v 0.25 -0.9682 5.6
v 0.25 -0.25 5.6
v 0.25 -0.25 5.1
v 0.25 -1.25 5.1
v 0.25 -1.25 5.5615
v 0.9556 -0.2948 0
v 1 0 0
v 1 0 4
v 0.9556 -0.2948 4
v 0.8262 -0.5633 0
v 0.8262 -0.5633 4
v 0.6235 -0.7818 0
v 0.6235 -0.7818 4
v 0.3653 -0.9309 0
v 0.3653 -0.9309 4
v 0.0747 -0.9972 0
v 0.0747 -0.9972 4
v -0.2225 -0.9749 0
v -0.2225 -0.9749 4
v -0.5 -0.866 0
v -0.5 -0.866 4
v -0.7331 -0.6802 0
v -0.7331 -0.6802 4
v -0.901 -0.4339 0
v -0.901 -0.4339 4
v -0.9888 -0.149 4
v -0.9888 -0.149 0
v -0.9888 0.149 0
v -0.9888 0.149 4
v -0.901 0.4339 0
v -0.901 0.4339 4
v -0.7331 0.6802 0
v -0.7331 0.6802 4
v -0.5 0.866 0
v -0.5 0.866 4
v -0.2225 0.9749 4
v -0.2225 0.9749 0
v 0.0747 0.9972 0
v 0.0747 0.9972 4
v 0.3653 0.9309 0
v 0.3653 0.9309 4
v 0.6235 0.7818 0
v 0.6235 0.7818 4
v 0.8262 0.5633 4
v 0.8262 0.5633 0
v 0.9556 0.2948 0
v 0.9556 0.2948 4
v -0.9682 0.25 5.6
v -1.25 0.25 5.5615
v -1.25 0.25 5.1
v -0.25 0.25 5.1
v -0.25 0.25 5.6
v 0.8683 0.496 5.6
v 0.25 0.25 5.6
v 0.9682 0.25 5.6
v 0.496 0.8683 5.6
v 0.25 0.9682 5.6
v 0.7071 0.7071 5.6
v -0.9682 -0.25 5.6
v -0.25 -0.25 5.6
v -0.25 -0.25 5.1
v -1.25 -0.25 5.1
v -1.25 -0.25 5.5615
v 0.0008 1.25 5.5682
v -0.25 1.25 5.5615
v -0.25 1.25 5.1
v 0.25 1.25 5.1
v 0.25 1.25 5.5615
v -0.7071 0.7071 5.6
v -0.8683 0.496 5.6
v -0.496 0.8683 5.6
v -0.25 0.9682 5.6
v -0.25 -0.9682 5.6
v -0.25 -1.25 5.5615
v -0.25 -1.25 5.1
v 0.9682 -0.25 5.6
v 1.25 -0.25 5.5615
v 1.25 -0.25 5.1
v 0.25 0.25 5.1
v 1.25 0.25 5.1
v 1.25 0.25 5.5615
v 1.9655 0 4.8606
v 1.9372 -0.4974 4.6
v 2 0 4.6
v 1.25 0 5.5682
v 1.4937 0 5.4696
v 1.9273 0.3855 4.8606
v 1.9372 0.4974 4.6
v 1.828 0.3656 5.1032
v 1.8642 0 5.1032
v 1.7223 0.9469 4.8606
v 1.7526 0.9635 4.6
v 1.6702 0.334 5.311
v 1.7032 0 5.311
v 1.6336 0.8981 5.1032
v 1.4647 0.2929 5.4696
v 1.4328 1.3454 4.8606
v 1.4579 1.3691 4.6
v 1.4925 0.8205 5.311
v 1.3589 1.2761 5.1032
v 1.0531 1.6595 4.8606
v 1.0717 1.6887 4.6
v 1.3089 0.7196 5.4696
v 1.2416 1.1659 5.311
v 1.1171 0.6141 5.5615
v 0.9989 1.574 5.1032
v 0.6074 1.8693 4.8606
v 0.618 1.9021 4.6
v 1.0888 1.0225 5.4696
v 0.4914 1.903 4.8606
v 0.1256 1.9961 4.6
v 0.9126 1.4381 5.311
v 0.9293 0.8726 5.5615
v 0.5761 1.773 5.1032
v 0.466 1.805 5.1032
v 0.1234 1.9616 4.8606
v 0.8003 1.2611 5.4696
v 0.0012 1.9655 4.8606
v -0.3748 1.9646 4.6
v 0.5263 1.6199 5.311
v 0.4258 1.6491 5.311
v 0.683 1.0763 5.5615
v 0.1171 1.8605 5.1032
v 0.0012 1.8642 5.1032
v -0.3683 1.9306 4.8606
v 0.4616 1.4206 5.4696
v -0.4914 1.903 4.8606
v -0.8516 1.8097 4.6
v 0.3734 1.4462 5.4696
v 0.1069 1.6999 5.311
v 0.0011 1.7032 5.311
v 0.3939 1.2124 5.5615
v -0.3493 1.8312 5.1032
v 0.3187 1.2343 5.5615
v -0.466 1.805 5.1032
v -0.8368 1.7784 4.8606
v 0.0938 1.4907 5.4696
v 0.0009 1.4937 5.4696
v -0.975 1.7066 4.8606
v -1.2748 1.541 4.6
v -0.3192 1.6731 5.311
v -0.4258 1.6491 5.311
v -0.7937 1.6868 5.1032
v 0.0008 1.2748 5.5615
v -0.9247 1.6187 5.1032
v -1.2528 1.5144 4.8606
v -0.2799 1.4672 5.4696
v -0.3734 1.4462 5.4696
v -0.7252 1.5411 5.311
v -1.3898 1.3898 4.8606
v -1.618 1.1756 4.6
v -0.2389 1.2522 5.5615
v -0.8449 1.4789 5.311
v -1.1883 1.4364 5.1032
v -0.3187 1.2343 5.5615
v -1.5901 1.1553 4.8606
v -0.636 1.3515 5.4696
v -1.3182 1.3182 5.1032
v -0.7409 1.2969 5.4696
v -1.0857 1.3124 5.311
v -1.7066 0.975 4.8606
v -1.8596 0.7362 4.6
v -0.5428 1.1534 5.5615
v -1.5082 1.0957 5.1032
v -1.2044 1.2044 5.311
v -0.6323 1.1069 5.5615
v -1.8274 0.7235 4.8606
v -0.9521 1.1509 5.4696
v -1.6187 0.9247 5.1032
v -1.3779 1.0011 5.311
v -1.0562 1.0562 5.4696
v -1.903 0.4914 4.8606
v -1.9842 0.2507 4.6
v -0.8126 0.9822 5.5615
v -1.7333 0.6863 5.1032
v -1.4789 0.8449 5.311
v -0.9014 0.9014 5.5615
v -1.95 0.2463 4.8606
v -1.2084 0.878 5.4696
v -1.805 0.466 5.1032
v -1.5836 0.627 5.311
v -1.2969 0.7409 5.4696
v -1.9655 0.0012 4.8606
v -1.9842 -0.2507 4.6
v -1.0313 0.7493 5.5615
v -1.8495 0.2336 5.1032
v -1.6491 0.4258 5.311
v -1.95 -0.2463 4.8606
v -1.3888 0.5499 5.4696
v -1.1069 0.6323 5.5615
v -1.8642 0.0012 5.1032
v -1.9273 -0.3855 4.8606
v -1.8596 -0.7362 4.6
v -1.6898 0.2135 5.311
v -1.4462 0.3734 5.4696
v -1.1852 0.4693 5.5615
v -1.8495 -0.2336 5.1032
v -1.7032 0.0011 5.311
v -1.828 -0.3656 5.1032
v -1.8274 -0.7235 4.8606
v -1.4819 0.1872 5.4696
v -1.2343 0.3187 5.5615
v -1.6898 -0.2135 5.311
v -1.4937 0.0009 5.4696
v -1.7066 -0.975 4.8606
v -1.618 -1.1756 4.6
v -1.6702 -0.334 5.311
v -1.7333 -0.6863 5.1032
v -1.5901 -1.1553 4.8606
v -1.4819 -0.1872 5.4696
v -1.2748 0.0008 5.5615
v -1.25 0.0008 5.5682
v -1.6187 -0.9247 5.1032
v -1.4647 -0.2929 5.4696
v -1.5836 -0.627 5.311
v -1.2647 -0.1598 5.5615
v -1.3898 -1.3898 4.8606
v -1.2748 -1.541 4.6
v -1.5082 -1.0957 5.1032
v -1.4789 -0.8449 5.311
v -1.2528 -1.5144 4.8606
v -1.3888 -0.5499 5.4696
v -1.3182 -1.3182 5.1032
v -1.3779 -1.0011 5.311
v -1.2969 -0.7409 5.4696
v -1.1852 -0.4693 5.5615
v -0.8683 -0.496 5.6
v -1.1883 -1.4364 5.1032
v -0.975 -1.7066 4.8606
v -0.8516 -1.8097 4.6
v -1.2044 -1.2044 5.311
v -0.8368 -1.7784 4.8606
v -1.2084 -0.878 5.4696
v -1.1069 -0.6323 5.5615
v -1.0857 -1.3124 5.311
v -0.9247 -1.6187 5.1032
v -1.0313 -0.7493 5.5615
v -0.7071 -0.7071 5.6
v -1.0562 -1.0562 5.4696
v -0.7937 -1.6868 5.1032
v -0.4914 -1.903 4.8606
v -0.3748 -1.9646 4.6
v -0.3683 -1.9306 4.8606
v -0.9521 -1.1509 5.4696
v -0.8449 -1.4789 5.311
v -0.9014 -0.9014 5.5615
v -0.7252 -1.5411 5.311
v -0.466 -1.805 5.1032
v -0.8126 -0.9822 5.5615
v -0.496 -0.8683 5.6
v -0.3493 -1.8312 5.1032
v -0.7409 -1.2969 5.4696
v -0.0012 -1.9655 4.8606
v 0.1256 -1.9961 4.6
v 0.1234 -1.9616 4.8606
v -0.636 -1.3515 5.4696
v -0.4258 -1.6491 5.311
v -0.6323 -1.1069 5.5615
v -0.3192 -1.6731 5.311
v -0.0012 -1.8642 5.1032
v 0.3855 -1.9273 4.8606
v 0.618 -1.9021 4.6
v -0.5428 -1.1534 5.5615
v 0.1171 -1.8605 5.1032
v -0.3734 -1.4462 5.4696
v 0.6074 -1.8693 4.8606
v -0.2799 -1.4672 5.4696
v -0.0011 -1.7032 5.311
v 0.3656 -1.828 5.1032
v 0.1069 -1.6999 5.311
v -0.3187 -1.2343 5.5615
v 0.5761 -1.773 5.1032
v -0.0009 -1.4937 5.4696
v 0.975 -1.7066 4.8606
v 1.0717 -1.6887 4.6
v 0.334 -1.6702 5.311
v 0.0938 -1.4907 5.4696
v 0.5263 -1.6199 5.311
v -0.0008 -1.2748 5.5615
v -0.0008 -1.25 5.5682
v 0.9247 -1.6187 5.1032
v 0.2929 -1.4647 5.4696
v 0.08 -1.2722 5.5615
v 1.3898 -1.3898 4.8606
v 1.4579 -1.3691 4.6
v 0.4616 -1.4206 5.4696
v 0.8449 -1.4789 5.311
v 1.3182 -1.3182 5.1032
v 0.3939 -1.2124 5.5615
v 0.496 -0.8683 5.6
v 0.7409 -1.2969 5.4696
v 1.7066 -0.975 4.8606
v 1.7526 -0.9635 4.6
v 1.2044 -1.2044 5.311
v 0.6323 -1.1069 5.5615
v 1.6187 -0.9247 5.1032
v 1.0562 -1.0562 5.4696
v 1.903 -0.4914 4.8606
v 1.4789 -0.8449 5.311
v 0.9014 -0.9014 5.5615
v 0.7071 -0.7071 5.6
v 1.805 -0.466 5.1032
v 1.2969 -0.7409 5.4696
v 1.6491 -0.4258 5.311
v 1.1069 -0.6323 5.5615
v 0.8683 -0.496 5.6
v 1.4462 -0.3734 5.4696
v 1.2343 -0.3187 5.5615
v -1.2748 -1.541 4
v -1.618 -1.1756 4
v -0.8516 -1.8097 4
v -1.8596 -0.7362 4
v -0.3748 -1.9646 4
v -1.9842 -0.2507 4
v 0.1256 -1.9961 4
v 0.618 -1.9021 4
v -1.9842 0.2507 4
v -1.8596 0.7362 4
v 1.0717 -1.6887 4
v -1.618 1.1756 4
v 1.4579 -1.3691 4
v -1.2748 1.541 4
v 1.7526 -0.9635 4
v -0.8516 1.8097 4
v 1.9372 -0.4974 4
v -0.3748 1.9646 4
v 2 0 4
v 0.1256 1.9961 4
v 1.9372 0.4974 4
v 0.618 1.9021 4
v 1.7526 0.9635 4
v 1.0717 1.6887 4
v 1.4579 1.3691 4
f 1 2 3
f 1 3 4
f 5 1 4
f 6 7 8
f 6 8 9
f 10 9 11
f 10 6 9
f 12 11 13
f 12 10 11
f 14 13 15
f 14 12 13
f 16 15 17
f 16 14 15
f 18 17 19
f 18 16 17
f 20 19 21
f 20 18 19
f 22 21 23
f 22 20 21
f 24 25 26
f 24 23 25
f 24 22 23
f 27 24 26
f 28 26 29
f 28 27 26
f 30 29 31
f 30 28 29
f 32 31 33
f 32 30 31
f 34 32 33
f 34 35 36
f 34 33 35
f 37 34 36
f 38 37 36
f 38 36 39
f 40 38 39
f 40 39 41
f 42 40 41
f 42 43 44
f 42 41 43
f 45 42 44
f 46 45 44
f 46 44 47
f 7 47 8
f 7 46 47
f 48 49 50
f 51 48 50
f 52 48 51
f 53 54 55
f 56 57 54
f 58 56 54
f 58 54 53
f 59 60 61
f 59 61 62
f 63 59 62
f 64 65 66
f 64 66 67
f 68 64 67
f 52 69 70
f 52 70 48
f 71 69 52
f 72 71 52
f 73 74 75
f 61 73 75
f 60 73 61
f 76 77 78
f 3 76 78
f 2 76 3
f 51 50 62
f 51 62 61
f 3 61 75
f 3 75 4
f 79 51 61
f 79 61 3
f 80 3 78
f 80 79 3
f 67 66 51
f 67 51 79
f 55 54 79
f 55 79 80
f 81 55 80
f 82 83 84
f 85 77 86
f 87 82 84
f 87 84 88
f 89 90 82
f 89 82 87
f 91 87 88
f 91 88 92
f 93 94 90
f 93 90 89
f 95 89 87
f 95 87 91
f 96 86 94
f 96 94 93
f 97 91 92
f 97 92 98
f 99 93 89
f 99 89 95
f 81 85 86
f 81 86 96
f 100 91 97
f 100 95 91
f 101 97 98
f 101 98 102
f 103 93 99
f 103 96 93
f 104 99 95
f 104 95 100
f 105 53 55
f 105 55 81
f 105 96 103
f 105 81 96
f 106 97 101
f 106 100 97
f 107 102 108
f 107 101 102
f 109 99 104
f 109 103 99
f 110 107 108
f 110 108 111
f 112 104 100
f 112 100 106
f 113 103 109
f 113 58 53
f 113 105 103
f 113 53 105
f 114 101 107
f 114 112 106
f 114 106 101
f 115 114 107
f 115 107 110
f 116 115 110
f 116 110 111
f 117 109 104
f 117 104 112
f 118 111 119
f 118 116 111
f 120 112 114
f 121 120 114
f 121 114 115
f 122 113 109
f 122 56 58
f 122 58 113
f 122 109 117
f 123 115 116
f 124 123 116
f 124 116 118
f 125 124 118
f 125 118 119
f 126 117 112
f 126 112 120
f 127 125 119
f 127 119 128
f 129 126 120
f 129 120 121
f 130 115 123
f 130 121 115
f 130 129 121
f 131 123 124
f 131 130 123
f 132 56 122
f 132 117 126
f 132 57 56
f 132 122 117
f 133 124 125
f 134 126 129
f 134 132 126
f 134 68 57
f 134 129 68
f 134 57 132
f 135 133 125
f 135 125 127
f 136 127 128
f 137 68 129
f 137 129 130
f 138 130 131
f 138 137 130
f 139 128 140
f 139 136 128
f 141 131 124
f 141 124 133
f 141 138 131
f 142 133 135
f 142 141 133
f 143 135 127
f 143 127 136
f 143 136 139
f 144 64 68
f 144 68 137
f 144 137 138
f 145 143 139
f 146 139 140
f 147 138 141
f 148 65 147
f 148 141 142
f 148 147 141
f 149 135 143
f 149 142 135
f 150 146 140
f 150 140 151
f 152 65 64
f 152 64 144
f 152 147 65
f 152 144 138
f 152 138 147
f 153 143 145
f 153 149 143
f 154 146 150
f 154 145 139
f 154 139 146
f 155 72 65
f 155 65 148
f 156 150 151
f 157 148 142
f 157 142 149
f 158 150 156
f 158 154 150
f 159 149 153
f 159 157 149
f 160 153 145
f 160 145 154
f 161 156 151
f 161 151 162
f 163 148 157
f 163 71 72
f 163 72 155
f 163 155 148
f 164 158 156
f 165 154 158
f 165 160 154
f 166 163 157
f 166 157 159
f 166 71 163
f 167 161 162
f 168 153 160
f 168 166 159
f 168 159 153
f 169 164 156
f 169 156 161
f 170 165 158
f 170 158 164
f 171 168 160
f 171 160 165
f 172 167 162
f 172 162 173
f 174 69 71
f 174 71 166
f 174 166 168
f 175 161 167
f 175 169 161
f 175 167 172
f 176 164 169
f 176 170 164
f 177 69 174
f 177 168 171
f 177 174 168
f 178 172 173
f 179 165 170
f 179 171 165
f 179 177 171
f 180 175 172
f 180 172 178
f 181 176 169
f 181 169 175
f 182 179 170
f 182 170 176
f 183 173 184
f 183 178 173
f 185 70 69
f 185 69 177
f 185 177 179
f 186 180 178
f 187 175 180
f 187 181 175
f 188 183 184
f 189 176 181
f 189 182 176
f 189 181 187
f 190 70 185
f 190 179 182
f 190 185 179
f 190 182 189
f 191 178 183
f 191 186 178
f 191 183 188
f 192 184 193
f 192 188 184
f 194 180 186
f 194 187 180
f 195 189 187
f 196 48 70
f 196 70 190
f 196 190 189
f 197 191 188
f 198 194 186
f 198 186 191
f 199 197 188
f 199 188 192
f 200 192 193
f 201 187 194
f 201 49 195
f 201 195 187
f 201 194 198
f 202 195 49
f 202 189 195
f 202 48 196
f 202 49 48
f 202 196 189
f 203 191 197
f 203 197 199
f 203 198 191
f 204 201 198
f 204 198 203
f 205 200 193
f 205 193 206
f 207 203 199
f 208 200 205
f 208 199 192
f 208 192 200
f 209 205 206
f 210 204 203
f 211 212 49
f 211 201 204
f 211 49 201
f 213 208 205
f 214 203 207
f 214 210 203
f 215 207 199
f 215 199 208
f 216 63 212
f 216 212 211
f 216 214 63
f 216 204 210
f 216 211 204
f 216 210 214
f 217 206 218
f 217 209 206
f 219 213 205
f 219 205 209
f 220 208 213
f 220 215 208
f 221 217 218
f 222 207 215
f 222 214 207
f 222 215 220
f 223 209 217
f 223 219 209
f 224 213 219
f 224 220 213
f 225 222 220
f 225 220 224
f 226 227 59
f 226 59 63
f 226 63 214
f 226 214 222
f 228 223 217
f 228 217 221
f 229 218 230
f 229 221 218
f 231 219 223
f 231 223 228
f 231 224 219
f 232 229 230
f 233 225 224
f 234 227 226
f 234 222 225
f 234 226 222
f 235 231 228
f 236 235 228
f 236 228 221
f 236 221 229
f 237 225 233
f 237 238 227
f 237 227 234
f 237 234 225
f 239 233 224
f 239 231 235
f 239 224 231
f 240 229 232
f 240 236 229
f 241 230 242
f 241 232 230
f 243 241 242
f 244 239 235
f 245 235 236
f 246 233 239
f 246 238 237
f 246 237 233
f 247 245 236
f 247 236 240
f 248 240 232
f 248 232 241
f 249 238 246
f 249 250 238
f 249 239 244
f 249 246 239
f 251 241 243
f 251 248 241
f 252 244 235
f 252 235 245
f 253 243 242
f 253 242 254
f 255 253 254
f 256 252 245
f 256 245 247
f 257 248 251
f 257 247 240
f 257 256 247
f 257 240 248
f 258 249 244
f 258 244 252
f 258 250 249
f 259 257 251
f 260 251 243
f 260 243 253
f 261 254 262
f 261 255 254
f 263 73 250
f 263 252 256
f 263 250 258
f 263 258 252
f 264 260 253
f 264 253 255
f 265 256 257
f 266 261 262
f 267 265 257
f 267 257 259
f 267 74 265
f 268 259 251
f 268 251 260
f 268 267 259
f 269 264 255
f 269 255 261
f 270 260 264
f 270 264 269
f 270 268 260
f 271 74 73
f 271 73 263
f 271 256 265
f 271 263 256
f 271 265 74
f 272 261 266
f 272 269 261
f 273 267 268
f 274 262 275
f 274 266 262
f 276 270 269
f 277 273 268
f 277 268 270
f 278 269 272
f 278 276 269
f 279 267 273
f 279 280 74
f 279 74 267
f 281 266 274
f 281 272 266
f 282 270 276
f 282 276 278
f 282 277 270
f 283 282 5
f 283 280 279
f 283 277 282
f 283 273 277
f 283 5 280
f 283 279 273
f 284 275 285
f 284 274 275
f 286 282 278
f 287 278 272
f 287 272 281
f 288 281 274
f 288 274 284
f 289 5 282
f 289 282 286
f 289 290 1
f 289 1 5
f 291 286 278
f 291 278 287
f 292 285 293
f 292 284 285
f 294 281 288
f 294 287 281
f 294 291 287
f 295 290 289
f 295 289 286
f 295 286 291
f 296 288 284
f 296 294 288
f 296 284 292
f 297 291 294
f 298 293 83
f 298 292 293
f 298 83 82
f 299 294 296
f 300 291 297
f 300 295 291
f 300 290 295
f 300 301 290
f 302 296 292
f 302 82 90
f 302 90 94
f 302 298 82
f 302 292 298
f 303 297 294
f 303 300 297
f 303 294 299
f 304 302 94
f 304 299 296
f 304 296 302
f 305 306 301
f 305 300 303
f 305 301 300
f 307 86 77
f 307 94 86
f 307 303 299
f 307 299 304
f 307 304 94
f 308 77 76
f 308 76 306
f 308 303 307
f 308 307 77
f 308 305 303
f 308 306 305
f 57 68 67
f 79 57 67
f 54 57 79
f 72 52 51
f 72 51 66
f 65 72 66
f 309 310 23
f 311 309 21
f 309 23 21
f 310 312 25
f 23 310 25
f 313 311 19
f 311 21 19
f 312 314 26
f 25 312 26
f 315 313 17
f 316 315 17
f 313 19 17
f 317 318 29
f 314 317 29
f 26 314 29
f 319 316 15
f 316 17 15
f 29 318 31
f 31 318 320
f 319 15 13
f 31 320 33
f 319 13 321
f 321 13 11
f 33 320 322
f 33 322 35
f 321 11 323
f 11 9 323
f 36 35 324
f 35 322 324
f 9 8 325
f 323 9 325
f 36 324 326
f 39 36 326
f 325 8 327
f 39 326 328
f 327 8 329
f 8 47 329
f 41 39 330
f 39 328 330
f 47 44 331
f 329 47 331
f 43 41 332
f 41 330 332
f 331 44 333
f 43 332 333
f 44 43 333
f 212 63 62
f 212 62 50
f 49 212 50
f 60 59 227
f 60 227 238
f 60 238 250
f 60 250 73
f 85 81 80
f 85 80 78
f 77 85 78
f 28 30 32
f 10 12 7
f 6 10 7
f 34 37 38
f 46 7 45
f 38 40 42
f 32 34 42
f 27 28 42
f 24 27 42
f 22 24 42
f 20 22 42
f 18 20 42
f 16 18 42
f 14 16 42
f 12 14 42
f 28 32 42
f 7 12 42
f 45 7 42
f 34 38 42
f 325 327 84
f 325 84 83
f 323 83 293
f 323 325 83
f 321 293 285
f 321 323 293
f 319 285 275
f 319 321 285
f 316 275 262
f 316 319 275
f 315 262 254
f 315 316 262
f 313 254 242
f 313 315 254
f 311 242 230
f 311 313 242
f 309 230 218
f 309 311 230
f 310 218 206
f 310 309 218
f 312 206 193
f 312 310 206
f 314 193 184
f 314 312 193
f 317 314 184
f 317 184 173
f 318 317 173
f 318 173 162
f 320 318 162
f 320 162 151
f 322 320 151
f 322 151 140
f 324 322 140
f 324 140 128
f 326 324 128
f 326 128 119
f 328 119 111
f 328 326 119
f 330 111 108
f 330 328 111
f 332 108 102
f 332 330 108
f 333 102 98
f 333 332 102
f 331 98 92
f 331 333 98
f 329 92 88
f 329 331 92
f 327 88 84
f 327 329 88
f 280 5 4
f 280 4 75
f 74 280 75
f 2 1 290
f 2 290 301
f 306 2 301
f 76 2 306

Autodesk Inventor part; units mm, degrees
ref_plane "YZ Plane" through (0, 0, 0) normal (1, 0, 0) x (0, 1, 0)
ref_plane "XZ Plane" through (0, 0, 0) normal (0, 1, 0) x (-1, 0, 0)
ref_plane "XY Plane" through (0, 0, 0) normal (0, 0, 1) x (1, 0, 0)
sketch "Sketch1" plane through (0, 0, 0) normal (0, 0, 1) x (1, 0, 0)
  circle A0 centre (0, 0) radius 1
  dimension "d0" = 2
extrude "Extrusion1" add sketch "Sketch1" along normal blind 4
sketch "Sketch2" plane through (0, 0, 4) normal (0, 0, 1) x (1, 0, 0)
  circle A0 centre (0, 0) radius 2
  dimension "d3" = 4
extrude "Extrusion2" add sketch "Sketch2" along normal blind 1.6
thread "Thread1" size "M2x0.4" class "6g" standard "ANSI Metric M Profile" full length
fillet "Fillet1" radius 1 1 edges at (-2, 0, 5.6)
sketch "Sketch3" plane through (0, 0, 5.6) normal (0, 0, 1) x (1, 0, 0)
  line L0 (-0.25, 1.25) -> (0.25, 1.25)
  line L1 (0.25, 1.25) -> (0.25, -1.25)
  line L2 (0.25, -1.25) -> (-0.25, -1.25)
  line L3 (-0.25, -1.25) -> (-0.25, 1.25)
  line L4 (-1.25, 0.25) -> (1.25, 0.25)
  line L5 (1.25, 0.25) -> (1.25, -0.25)
  line L6 (1.25, -0.25) -> (-1.25, -0.25)
  line L7 (-1.25, -0.25) -> (-1.25, 0.25)
  point P0 (0, 0)
  dimension "d9" = 0.5
  dimension "d10" = 2.5
  dimension "d11" = 2.5
  dimension "d12" = 0.5
  dimension "d13" = 0.25
  dimension "d14" = 1.25
  dimension "d15" = 0.25
  dimension "d16" = 1.25
extrude "Extrusion3" cut sketch "Sketch3" against normal blind 0.5
properties part number "M2 Screw" material "Steel"
